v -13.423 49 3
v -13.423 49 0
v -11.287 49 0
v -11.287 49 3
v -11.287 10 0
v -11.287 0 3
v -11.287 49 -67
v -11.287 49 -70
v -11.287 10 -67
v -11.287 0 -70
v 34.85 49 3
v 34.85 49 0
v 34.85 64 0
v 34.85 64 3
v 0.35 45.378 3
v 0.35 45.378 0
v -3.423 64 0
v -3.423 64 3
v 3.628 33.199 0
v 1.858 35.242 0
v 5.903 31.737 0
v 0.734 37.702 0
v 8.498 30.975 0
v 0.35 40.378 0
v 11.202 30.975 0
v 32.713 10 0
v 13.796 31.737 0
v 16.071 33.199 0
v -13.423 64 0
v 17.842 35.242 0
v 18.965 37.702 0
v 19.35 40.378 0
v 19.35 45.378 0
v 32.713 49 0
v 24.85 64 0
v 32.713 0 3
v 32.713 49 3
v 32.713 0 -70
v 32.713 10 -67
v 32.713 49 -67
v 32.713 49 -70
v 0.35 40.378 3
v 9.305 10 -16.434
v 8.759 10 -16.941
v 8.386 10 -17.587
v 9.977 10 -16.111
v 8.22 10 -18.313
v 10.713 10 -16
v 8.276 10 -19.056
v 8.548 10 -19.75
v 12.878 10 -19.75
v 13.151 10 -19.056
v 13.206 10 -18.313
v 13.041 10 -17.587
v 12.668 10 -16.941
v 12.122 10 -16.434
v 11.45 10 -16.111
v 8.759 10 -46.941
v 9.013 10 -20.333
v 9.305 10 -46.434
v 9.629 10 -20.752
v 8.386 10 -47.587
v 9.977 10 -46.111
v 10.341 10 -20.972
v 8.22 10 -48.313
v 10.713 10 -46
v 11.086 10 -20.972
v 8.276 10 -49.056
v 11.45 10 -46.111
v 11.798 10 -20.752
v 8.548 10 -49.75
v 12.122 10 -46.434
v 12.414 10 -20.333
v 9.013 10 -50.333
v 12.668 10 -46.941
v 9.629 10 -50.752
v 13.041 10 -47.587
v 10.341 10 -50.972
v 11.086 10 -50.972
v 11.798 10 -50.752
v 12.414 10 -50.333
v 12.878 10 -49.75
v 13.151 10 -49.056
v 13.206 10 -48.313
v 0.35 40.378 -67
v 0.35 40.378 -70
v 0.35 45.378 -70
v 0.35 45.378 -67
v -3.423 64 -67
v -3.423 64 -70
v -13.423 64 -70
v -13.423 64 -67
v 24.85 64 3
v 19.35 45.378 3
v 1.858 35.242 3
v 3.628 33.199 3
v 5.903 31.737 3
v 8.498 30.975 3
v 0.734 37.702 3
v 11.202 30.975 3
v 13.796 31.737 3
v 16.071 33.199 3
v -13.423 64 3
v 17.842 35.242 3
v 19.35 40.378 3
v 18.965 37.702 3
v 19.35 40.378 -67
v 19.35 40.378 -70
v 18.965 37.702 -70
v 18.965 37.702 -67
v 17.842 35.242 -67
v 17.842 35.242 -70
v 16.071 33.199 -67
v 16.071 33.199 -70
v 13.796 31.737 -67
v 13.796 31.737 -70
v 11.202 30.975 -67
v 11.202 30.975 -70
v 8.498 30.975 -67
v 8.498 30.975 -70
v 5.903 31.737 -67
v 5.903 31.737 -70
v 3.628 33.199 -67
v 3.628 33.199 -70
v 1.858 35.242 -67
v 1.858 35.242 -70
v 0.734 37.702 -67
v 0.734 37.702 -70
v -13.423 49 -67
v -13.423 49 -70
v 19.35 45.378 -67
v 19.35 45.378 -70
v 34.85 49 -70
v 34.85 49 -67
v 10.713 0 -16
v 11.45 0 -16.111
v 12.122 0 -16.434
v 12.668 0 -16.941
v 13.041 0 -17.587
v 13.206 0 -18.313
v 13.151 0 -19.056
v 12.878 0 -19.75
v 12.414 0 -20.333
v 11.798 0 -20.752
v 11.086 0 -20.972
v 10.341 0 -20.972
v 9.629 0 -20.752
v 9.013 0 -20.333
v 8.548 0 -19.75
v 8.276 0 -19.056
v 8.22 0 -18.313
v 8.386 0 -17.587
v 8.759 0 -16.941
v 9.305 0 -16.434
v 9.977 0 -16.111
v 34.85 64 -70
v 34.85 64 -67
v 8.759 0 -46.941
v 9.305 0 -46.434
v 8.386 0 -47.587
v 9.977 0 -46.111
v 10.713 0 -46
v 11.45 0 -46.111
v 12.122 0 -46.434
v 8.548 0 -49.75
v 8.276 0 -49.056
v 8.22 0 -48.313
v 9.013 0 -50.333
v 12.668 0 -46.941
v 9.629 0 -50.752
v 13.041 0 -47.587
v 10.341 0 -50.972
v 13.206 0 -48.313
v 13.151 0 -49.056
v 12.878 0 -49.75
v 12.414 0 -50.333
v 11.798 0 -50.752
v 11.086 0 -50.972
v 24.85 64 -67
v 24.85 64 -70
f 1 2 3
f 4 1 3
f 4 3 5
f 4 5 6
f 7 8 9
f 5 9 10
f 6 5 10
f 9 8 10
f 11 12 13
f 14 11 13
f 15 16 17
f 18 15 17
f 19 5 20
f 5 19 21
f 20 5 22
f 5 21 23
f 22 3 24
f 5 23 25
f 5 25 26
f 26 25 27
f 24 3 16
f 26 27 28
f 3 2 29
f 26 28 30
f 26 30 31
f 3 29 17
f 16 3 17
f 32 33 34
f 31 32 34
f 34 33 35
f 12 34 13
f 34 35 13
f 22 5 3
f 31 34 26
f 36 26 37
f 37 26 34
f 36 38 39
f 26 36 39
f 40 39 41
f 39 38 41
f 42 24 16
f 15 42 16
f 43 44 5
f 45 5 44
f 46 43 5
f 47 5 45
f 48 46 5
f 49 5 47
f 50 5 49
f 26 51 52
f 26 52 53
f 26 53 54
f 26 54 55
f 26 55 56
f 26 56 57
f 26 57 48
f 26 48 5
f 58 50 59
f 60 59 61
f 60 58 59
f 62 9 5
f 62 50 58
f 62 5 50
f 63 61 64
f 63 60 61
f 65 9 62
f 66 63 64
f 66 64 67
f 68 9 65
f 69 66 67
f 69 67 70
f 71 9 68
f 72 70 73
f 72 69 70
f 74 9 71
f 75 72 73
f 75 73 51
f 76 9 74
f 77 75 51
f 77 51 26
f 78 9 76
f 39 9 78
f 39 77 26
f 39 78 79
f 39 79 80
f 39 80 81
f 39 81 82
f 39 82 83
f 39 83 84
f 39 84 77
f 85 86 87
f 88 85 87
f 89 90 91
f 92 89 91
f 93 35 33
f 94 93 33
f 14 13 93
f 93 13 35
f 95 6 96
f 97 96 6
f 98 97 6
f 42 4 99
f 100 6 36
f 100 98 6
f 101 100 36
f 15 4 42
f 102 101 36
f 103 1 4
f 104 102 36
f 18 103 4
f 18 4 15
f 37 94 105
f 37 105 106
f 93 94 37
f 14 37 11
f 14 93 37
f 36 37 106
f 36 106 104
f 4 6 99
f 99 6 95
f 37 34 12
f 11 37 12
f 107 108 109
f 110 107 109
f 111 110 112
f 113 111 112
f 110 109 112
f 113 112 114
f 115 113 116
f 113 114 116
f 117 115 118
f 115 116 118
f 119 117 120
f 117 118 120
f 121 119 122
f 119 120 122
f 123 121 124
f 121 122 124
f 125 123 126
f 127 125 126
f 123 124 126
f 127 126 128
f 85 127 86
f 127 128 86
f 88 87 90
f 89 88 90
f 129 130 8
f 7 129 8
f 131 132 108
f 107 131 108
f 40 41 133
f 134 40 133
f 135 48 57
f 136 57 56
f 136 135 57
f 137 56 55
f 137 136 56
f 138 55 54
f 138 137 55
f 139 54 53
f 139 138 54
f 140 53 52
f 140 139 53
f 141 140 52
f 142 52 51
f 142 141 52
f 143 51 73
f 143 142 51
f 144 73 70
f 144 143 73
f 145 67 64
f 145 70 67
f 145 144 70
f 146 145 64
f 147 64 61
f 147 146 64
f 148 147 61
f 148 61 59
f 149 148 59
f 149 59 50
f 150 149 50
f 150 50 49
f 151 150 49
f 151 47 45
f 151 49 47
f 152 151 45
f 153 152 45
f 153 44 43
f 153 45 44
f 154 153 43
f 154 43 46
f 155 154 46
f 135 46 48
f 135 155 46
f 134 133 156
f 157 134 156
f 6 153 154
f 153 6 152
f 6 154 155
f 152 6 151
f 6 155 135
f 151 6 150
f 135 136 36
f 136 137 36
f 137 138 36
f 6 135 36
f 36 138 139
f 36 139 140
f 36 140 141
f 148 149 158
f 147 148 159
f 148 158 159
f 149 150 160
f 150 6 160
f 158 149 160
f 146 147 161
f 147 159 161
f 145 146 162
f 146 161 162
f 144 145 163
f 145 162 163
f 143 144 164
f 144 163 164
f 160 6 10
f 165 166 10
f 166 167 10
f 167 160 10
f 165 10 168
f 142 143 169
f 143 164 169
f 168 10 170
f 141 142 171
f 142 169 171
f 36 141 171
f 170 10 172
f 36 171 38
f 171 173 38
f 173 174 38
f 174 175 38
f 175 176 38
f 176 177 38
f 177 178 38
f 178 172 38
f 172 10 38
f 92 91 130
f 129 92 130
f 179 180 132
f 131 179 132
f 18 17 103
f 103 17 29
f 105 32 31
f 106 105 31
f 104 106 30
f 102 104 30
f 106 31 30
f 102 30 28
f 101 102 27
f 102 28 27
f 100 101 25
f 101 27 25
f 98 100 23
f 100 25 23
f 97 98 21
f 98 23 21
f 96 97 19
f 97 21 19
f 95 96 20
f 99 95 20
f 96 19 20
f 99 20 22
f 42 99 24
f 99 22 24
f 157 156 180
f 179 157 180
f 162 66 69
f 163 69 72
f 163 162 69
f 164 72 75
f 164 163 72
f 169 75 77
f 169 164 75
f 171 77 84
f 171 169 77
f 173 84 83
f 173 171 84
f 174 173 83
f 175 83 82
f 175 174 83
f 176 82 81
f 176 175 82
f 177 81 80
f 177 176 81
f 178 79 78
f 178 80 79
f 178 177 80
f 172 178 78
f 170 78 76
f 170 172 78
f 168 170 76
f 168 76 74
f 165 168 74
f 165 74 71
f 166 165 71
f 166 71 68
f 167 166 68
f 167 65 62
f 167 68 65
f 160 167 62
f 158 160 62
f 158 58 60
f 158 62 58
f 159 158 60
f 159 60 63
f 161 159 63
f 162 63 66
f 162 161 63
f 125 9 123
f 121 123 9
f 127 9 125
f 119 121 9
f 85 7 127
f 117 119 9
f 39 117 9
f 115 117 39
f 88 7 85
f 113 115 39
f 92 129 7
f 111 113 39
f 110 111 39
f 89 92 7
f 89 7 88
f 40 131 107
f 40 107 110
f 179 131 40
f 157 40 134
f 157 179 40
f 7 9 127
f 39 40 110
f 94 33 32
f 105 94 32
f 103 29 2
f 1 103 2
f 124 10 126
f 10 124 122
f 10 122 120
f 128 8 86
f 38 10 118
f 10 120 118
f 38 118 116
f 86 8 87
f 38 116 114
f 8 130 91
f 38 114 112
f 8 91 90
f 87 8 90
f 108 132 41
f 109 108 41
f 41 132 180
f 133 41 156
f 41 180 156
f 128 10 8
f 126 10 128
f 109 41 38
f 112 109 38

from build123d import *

# Parameters (mm, degrees)
BOSS_EXTRUDE2_DEPTH = 3
SKETCH2_W           = 44
SKETCH2_H           = 70
BOSS_EXTRUDE3_DEPTH = 10
BOSS_EXTRUDE4_DEPTH = 3
CUT_EXTRUDE1_REACH  = 103.047
SKETCH7_R           = 2.5


with BuildPart() as part:
    # Sketch1 → Boss-Extrude2 (new body)
    with BuildSketch(Plane.XY):
        with BuildLine():
            Line((-11.286595542, 0), (32.713404458, 0))
            Line((32.713404458, 0), (32.713404458, 49))
            Line((32.713404458, 49), (34.849610431, 49))
            Line((34.849610431, 49), (34.849610431, 64))
            Line((34.849610431, 64), (24.849610431, 64))
            Line((24.849610431, 64), (19.349610431, 45.378267854))
            Line((19.349610431, 45.378267854), (19.349610431, 40.378267854))
            ThreePointArc((19.349610431, 40.378267854), (9.849610431, 30.878267854), (0.349610431, 40.378267854))
            Line((0.349610431, 40.378267854), (0.349610431, 45.378267854))
            Line((0.349610431, 45.378267854), (-3.422801515, 64))
            Line((-3.422801515, 64), (-13.422801515, 64))
            Line((-13.422801515, 64), (-13.422801515, 49))
            Line((-13.422801515, 49), (-11.286595542, 49))
            Line((-11.286595542, 49), (-11.286595542, 0))
        make_face()
    extrude(amount=BOSS_EXTRUDE2_DEPTH)

    # Sketch2 → Boss-Extrude3 (add)
    with BuildSketch(Plane(origin=(0, 0, 0), x_dir=(1, 0, 0), z_dir=(0, 1, 0))):
        with Locations((10.713404458, 35)):
            Rectangle(SKETCH2_W, SKETCH2_H)
    extrude(amount=BOSS_EXTRUDE3_DEPTH)

    # Sketch4 → Boss-Extrude4 (add)
    with BuildSketch(Plane.XY.offset(-70)):
        with BuildLine():
            Line((34.849610431, 64), (24.849610431, 64))
            Line((24.849610431, 64), (19.349610431, 45.378267854))
            Line((19.349610431, 45.378267854), (19.349610431, 40.378267854))
            ThreePointArc((19.349610431, 40.378267854), (9.849610431, 30.878267854), (0.349610431, 40.378267854))
            Line((0.349610431, 40.378267854), (0.349610431, 45.378267854))
            Line((0.349610431, 45.378267854), (-3.422801515, 64))
            Line((-3.422801515, 64), (-13.422801515, 64))
            Line((-13.422801515, 64), (-13.422801515, 49))
            Line((-13.422801515, 49), (-11.286595542, 49))
            Line((-11.286595542, 49), (-11.286595542, 0))
            Line((-11.286595542, 0), (32.713404458, 0))
            Line((32.713404458, 0), (32.713404458, 49))
            Line((32.713404458, 49), (34.849610431, 49))
            Line((34.849610431, 49), (34.849610431, 64))
        make_face()
    extrude(amount=BOSS_EXTRUDE4_DEPTH)

    # Sketch7 → Cut-Extrude1 (cut, up to next)
    with BuildSketch(Plane(origin=(0, 0, 0), x_dir=(1, 0, 0), z_dir=(0, 1, 0)), mode=Mode.PRIVATE) as cut_extrude1_sk1:
        with Locations(Location((10.713404458, 48.5, 0), (0, 0, 270))):
            Circle(SKETCH7_R)
    cut_extrude1_tool1 = extrude(cut_extrude1_sk1.sketch, amount=CUT_EXTRUDE1_REACH, mode=Mode.PRIVATE) & part.part
    # Sketch7 → Cut-Extrude1 (cut, up to next)
    with BuildSketch(Plane(origin=(0, 0, 0), x_dir=(1, 0, 0), z_dir=(0, 1, 0)), mode=Mode.PRIVATE) as cut_extrude1_sk2:
        with Locations(Location((10.713404458, 18.5, 0), (0, 0, 270))):
            Circle(SKETCH7_R)
    cut_extrude1_tool2 = extrude(cut_extrude1_sk2.sketch, amount=CUT_EXTRUDE1_REACH, mode=Mode.PRIVATE) & part.part
    add(cut_extrude1_tool1.solids().sort_by_distance((10.713404, 0, -48.5))[0], mode=Mode.SUBTRACT)
    add(cut_extrude1_tool2.solids().sort_by_distance((10.713404, 0, -18.5))[0], mode=Mode.SUBTRACT)


solid = part.part
